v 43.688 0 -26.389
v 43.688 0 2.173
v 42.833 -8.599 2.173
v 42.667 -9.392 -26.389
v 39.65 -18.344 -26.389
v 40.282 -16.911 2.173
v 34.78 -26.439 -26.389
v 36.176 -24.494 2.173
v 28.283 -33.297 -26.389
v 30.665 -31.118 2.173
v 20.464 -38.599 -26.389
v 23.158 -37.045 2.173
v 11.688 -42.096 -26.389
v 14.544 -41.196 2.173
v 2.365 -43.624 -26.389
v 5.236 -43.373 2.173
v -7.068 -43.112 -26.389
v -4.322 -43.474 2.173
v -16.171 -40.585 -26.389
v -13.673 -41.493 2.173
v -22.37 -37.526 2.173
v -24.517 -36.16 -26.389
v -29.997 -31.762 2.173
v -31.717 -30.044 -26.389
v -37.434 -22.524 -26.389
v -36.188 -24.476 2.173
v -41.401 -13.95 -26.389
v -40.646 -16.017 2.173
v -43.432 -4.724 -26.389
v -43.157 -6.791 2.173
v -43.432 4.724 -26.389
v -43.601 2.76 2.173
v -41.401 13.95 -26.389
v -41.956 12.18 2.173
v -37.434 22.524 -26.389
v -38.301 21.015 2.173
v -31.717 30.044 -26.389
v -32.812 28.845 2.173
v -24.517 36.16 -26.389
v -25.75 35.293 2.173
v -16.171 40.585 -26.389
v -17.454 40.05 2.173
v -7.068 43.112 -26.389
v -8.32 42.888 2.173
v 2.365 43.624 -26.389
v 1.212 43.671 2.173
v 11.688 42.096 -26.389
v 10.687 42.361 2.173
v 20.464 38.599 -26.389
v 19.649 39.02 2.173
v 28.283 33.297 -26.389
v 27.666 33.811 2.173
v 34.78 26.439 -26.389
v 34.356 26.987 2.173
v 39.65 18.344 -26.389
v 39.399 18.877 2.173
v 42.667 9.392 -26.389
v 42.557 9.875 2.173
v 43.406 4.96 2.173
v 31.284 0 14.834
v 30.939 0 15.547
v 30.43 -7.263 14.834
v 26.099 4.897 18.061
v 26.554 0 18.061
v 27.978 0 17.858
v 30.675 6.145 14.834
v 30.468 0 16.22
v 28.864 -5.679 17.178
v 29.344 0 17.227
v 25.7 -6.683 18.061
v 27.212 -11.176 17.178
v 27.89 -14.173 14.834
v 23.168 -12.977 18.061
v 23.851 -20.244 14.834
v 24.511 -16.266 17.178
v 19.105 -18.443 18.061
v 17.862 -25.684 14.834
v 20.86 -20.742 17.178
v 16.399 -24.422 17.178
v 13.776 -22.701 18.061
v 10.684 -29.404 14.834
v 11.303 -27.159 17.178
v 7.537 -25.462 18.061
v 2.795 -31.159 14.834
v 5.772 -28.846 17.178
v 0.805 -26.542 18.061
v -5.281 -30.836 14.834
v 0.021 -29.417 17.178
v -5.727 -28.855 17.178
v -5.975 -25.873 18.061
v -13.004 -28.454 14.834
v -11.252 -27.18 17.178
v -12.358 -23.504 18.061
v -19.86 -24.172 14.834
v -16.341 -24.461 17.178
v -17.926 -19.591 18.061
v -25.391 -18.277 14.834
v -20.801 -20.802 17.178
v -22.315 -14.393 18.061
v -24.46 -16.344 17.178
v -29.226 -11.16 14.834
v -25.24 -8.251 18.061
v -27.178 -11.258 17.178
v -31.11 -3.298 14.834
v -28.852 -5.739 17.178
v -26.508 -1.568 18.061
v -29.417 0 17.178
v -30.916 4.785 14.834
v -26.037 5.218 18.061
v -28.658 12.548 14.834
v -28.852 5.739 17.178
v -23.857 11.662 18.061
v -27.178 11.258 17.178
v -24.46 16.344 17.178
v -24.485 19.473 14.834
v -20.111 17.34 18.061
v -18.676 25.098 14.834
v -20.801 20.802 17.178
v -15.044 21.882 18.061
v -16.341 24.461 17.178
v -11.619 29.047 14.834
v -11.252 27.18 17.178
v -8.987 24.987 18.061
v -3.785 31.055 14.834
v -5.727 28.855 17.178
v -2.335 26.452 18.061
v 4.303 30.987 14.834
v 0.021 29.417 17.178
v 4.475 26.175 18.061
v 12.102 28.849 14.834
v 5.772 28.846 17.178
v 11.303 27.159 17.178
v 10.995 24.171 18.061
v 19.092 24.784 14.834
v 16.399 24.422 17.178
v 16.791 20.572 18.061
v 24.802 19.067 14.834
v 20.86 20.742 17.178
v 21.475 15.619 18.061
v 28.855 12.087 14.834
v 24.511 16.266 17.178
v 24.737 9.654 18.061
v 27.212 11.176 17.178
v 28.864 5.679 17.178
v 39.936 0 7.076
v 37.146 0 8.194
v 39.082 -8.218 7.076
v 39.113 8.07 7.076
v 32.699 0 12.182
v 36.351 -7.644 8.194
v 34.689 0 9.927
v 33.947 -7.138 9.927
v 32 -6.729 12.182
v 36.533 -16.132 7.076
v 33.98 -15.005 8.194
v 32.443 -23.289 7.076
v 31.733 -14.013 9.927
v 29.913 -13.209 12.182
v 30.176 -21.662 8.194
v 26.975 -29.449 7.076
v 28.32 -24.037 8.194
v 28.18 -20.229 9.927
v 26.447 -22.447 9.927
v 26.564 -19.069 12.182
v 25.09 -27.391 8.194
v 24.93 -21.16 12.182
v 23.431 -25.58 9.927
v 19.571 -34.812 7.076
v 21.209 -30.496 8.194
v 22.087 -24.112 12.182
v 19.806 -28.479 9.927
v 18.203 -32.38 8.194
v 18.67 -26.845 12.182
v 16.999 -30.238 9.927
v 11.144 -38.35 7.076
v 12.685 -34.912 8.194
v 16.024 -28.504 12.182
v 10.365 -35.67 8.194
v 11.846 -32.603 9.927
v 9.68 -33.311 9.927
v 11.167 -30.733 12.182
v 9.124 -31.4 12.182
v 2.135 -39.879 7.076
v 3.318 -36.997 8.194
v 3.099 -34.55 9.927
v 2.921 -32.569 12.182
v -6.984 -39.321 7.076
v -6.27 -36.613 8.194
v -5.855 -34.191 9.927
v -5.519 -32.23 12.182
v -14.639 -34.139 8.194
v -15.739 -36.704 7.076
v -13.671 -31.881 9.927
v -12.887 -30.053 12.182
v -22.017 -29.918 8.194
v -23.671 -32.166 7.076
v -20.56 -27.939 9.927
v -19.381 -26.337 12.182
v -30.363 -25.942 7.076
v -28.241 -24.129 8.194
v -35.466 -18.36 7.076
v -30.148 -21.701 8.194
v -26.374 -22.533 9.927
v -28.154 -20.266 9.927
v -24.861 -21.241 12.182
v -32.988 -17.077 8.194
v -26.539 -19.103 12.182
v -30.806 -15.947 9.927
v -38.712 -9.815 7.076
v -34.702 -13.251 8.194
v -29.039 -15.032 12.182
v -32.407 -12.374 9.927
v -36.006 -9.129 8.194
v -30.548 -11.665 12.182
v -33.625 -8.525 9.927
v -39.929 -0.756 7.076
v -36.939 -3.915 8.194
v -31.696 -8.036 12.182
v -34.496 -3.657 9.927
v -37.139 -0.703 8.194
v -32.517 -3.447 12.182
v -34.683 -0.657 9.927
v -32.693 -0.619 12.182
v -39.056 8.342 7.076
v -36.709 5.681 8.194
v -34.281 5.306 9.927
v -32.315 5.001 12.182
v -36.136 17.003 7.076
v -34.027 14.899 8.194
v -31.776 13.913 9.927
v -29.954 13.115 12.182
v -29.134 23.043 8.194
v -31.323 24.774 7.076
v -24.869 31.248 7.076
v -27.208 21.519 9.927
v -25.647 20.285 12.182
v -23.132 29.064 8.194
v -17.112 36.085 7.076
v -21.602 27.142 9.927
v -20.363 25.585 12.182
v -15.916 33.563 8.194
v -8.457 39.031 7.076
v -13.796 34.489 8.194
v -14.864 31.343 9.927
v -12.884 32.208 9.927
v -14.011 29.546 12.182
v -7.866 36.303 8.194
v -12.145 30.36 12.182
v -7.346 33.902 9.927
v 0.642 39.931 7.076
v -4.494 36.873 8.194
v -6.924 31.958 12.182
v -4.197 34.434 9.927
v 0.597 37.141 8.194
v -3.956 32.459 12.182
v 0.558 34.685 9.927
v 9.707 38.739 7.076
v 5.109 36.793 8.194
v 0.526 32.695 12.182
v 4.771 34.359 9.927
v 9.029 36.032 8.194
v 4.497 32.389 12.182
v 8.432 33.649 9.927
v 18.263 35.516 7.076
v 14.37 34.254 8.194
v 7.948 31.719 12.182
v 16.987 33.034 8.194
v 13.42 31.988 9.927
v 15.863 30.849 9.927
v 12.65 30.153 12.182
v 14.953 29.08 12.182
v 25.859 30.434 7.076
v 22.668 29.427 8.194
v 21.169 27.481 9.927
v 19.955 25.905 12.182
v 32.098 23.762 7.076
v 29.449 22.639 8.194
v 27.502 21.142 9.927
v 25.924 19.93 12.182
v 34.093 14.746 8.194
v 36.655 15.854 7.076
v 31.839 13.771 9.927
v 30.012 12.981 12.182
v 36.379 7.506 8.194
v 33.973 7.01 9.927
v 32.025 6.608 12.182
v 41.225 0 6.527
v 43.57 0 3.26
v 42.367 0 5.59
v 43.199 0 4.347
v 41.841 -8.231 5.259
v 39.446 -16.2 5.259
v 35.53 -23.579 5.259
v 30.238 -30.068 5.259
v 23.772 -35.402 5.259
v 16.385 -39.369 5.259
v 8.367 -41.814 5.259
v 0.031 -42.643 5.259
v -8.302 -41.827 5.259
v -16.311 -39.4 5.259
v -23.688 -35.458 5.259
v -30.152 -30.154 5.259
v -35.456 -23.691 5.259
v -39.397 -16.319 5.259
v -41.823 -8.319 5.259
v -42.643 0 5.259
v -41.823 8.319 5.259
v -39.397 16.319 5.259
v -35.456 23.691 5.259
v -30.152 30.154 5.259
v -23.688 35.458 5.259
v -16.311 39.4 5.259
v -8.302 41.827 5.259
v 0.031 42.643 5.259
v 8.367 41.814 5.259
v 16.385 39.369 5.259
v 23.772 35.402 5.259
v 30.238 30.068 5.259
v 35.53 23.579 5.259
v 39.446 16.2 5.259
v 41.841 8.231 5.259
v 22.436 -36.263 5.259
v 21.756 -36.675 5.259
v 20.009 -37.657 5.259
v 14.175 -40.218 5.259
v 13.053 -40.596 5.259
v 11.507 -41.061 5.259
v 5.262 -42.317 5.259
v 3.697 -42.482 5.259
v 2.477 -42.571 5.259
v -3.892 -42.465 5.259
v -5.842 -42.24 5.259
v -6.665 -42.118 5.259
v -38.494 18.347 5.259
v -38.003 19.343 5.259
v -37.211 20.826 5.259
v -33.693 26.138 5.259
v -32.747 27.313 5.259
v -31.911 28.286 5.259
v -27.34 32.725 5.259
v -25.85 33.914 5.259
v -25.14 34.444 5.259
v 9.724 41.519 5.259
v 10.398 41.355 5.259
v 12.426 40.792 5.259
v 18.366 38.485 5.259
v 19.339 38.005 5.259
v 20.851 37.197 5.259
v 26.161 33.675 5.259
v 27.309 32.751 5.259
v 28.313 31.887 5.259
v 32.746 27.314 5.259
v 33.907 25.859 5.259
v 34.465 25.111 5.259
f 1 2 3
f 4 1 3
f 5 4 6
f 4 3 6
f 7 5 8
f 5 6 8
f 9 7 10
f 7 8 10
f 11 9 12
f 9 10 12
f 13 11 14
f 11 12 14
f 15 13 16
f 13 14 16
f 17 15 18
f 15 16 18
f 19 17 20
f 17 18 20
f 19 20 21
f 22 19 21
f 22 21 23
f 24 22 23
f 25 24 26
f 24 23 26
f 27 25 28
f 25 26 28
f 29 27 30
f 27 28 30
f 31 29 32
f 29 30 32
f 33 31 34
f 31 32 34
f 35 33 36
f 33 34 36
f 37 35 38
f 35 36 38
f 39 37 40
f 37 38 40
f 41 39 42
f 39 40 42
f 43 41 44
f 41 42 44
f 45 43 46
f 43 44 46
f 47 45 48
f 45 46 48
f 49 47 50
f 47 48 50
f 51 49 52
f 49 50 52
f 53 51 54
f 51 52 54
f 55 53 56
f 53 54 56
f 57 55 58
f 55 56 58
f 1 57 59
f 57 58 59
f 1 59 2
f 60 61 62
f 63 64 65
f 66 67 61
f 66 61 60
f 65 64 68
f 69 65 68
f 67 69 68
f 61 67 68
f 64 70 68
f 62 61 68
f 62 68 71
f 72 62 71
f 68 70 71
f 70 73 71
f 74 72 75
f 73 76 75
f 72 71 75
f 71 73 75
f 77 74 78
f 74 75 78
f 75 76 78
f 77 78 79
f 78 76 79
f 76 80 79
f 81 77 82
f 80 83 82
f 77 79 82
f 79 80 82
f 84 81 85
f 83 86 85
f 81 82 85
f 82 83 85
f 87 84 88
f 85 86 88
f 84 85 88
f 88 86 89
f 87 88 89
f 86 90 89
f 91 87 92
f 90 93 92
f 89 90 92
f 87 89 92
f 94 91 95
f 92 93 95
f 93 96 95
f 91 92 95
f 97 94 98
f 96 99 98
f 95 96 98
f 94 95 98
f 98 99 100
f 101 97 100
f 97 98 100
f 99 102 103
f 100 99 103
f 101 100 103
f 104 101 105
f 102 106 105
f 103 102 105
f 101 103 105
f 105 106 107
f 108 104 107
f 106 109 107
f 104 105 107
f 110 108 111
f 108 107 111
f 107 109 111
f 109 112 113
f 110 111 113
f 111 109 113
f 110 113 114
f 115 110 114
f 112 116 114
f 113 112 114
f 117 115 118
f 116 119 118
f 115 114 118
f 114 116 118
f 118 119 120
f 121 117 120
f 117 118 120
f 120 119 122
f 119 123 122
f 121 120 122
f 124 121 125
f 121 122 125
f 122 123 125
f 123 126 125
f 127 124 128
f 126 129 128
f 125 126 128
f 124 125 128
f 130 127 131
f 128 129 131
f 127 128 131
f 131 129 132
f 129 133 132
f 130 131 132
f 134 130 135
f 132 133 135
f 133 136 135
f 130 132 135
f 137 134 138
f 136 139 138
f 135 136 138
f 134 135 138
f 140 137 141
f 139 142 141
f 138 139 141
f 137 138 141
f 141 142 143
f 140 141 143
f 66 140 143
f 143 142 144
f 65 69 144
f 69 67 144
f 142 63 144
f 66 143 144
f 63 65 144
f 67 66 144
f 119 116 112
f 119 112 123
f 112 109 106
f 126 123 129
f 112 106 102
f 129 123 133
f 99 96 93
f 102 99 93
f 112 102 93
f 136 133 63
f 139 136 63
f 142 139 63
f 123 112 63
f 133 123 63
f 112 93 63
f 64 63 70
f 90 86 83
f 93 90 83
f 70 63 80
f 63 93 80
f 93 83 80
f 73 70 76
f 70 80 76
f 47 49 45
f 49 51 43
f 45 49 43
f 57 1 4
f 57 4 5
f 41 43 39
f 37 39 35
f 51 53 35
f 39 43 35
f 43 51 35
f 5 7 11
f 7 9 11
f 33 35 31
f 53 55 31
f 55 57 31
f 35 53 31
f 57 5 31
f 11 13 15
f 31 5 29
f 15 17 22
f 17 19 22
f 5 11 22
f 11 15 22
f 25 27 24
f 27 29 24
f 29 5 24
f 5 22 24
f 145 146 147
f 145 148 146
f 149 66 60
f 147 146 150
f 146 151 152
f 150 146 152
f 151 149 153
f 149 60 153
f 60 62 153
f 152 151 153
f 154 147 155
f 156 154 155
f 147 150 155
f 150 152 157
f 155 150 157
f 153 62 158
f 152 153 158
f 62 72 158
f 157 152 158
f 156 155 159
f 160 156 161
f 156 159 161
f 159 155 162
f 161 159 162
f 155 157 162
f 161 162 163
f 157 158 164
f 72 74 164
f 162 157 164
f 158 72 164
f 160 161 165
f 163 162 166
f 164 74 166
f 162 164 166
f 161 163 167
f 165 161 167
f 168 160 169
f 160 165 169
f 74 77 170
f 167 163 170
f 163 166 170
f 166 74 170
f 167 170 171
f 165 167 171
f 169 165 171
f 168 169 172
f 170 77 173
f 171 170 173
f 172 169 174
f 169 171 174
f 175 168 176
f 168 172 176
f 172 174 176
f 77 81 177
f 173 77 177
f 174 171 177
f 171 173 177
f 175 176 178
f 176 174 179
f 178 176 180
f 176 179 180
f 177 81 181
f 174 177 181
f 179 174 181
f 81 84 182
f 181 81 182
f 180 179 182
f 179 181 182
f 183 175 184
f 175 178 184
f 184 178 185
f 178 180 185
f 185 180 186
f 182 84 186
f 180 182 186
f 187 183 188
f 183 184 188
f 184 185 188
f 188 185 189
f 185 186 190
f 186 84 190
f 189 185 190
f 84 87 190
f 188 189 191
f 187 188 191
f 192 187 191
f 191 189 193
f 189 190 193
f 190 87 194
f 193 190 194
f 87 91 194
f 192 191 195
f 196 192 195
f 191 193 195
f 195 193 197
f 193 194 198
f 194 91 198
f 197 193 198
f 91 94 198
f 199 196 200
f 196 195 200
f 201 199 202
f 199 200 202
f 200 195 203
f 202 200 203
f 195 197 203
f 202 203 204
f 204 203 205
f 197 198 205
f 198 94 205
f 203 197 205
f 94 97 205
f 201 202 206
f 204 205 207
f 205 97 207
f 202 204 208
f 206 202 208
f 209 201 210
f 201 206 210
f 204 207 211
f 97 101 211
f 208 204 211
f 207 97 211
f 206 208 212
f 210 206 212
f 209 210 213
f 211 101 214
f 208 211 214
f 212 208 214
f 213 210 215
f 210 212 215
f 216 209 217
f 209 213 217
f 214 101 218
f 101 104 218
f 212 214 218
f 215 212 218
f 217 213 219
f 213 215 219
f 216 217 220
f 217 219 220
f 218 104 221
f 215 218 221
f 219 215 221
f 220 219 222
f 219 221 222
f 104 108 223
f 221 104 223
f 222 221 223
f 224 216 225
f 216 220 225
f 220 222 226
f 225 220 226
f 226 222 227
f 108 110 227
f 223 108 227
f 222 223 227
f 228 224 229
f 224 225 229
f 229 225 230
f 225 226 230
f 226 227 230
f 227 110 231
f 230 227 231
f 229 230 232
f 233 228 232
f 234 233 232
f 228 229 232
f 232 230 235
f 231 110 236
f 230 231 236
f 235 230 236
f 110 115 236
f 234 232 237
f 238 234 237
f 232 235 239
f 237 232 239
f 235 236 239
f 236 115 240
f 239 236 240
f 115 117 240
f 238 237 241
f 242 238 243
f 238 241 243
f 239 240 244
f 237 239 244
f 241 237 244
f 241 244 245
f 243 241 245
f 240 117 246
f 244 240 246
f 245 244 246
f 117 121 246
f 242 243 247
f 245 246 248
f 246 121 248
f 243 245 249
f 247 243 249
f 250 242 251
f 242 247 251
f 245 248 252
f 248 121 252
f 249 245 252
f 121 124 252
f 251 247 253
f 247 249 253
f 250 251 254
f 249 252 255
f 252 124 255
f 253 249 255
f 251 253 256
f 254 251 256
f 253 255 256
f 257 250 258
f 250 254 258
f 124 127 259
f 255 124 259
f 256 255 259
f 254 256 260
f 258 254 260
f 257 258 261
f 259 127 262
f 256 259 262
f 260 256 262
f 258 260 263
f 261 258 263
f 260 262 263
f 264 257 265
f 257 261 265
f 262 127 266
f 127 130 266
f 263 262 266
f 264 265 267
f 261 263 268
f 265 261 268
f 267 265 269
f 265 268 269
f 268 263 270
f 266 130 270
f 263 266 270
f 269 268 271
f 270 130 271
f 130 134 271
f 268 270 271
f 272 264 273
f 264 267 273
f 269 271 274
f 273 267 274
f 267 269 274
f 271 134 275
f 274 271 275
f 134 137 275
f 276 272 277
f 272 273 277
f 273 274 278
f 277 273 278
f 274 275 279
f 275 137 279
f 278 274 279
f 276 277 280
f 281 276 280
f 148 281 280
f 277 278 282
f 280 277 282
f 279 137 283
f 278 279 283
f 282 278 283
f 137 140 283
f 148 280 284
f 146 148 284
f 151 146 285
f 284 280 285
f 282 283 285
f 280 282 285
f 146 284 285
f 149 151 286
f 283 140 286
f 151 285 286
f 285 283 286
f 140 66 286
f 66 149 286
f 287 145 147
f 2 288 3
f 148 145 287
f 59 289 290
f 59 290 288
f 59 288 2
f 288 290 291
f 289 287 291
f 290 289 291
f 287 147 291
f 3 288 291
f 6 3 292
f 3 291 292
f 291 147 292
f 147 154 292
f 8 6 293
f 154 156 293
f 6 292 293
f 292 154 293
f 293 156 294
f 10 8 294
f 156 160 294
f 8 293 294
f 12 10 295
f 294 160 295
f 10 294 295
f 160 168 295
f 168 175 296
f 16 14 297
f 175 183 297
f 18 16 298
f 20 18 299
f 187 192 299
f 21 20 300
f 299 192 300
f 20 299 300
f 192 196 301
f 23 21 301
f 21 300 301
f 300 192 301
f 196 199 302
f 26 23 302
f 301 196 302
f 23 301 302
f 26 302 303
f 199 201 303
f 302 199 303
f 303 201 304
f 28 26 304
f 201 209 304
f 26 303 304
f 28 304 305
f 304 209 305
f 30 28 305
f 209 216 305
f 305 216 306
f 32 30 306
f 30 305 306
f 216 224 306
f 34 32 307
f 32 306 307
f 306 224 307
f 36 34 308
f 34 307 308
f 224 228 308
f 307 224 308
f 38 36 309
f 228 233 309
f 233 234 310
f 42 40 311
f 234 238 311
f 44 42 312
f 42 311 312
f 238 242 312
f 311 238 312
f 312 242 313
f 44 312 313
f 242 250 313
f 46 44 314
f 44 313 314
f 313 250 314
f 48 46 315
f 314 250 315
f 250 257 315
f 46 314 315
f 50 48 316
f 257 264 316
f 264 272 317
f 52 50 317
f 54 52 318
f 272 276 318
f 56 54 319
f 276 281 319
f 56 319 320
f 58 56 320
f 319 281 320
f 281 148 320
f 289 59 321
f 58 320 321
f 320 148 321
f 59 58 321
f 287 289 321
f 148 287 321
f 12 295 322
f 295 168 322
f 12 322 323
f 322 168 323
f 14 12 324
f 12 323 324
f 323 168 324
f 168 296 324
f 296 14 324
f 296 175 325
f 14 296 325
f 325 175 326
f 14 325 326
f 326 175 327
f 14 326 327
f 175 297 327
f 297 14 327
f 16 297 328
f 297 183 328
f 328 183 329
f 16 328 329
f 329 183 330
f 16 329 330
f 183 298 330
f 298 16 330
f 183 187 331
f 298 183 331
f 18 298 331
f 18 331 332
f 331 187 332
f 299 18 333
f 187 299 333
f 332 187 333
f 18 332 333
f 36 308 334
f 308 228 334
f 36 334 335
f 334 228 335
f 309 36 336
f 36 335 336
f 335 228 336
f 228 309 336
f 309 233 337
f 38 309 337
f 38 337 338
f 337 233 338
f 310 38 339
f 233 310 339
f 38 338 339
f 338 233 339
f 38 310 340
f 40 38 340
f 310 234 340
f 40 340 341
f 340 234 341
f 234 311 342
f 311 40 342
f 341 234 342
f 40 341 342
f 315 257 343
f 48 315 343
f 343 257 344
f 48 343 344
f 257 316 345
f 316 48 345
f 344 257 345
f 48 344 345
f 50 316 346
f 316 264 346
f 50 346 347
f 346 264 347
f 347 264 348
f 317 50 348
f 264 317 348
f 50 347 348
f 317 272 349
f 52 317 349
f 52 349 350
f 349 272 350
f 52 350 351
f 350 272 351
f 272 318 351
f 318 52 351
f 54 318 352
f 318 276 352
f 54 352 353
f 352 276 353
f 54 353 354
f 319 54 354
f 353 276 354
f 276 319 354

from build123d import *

# Parameters (mm, degrees)
F3_R = 5.08
F4_R = 5.08


with BuildPart() as f2:
    # F0 (on Front) → F2 (revolve)
    with BuildSketch(Plane.XZ):
        with BuildLine():
            Line((30.48, 18.0614531664), (0, 18.0614531664))
            Line((0, 18.0614531664), (0, -26.3885468336))
            Line((0, -26.3885468336), (43.688, -26.3885468336))
            Line((43.688, -26.3885468336), (43.688, 6.6314531664))
            ThreePointArc((43.688, 6.6314531664), (34.8601557432, 9.7766775807), (30.48, 18.0614531664))
        make_face()
    revolve(axis=Axis((0, 0, -49.3586864322), (0, 0, -1)))

    # F3
    f3_edges = [f2.edges().sort_by_distance(p)[0] for p in [
        (-30.48, 0, 18.061453),
    ]]
    fillet(f3_edges, radius=F3_R)

    # F4
    f4_edges = [f2.edges().sort_by_distance(p)[0] for p in [
        (-43.688, 0, 6.631453),
    ]]
    fillet(f4_edges, radius=F4_R)


solid = f2.part
